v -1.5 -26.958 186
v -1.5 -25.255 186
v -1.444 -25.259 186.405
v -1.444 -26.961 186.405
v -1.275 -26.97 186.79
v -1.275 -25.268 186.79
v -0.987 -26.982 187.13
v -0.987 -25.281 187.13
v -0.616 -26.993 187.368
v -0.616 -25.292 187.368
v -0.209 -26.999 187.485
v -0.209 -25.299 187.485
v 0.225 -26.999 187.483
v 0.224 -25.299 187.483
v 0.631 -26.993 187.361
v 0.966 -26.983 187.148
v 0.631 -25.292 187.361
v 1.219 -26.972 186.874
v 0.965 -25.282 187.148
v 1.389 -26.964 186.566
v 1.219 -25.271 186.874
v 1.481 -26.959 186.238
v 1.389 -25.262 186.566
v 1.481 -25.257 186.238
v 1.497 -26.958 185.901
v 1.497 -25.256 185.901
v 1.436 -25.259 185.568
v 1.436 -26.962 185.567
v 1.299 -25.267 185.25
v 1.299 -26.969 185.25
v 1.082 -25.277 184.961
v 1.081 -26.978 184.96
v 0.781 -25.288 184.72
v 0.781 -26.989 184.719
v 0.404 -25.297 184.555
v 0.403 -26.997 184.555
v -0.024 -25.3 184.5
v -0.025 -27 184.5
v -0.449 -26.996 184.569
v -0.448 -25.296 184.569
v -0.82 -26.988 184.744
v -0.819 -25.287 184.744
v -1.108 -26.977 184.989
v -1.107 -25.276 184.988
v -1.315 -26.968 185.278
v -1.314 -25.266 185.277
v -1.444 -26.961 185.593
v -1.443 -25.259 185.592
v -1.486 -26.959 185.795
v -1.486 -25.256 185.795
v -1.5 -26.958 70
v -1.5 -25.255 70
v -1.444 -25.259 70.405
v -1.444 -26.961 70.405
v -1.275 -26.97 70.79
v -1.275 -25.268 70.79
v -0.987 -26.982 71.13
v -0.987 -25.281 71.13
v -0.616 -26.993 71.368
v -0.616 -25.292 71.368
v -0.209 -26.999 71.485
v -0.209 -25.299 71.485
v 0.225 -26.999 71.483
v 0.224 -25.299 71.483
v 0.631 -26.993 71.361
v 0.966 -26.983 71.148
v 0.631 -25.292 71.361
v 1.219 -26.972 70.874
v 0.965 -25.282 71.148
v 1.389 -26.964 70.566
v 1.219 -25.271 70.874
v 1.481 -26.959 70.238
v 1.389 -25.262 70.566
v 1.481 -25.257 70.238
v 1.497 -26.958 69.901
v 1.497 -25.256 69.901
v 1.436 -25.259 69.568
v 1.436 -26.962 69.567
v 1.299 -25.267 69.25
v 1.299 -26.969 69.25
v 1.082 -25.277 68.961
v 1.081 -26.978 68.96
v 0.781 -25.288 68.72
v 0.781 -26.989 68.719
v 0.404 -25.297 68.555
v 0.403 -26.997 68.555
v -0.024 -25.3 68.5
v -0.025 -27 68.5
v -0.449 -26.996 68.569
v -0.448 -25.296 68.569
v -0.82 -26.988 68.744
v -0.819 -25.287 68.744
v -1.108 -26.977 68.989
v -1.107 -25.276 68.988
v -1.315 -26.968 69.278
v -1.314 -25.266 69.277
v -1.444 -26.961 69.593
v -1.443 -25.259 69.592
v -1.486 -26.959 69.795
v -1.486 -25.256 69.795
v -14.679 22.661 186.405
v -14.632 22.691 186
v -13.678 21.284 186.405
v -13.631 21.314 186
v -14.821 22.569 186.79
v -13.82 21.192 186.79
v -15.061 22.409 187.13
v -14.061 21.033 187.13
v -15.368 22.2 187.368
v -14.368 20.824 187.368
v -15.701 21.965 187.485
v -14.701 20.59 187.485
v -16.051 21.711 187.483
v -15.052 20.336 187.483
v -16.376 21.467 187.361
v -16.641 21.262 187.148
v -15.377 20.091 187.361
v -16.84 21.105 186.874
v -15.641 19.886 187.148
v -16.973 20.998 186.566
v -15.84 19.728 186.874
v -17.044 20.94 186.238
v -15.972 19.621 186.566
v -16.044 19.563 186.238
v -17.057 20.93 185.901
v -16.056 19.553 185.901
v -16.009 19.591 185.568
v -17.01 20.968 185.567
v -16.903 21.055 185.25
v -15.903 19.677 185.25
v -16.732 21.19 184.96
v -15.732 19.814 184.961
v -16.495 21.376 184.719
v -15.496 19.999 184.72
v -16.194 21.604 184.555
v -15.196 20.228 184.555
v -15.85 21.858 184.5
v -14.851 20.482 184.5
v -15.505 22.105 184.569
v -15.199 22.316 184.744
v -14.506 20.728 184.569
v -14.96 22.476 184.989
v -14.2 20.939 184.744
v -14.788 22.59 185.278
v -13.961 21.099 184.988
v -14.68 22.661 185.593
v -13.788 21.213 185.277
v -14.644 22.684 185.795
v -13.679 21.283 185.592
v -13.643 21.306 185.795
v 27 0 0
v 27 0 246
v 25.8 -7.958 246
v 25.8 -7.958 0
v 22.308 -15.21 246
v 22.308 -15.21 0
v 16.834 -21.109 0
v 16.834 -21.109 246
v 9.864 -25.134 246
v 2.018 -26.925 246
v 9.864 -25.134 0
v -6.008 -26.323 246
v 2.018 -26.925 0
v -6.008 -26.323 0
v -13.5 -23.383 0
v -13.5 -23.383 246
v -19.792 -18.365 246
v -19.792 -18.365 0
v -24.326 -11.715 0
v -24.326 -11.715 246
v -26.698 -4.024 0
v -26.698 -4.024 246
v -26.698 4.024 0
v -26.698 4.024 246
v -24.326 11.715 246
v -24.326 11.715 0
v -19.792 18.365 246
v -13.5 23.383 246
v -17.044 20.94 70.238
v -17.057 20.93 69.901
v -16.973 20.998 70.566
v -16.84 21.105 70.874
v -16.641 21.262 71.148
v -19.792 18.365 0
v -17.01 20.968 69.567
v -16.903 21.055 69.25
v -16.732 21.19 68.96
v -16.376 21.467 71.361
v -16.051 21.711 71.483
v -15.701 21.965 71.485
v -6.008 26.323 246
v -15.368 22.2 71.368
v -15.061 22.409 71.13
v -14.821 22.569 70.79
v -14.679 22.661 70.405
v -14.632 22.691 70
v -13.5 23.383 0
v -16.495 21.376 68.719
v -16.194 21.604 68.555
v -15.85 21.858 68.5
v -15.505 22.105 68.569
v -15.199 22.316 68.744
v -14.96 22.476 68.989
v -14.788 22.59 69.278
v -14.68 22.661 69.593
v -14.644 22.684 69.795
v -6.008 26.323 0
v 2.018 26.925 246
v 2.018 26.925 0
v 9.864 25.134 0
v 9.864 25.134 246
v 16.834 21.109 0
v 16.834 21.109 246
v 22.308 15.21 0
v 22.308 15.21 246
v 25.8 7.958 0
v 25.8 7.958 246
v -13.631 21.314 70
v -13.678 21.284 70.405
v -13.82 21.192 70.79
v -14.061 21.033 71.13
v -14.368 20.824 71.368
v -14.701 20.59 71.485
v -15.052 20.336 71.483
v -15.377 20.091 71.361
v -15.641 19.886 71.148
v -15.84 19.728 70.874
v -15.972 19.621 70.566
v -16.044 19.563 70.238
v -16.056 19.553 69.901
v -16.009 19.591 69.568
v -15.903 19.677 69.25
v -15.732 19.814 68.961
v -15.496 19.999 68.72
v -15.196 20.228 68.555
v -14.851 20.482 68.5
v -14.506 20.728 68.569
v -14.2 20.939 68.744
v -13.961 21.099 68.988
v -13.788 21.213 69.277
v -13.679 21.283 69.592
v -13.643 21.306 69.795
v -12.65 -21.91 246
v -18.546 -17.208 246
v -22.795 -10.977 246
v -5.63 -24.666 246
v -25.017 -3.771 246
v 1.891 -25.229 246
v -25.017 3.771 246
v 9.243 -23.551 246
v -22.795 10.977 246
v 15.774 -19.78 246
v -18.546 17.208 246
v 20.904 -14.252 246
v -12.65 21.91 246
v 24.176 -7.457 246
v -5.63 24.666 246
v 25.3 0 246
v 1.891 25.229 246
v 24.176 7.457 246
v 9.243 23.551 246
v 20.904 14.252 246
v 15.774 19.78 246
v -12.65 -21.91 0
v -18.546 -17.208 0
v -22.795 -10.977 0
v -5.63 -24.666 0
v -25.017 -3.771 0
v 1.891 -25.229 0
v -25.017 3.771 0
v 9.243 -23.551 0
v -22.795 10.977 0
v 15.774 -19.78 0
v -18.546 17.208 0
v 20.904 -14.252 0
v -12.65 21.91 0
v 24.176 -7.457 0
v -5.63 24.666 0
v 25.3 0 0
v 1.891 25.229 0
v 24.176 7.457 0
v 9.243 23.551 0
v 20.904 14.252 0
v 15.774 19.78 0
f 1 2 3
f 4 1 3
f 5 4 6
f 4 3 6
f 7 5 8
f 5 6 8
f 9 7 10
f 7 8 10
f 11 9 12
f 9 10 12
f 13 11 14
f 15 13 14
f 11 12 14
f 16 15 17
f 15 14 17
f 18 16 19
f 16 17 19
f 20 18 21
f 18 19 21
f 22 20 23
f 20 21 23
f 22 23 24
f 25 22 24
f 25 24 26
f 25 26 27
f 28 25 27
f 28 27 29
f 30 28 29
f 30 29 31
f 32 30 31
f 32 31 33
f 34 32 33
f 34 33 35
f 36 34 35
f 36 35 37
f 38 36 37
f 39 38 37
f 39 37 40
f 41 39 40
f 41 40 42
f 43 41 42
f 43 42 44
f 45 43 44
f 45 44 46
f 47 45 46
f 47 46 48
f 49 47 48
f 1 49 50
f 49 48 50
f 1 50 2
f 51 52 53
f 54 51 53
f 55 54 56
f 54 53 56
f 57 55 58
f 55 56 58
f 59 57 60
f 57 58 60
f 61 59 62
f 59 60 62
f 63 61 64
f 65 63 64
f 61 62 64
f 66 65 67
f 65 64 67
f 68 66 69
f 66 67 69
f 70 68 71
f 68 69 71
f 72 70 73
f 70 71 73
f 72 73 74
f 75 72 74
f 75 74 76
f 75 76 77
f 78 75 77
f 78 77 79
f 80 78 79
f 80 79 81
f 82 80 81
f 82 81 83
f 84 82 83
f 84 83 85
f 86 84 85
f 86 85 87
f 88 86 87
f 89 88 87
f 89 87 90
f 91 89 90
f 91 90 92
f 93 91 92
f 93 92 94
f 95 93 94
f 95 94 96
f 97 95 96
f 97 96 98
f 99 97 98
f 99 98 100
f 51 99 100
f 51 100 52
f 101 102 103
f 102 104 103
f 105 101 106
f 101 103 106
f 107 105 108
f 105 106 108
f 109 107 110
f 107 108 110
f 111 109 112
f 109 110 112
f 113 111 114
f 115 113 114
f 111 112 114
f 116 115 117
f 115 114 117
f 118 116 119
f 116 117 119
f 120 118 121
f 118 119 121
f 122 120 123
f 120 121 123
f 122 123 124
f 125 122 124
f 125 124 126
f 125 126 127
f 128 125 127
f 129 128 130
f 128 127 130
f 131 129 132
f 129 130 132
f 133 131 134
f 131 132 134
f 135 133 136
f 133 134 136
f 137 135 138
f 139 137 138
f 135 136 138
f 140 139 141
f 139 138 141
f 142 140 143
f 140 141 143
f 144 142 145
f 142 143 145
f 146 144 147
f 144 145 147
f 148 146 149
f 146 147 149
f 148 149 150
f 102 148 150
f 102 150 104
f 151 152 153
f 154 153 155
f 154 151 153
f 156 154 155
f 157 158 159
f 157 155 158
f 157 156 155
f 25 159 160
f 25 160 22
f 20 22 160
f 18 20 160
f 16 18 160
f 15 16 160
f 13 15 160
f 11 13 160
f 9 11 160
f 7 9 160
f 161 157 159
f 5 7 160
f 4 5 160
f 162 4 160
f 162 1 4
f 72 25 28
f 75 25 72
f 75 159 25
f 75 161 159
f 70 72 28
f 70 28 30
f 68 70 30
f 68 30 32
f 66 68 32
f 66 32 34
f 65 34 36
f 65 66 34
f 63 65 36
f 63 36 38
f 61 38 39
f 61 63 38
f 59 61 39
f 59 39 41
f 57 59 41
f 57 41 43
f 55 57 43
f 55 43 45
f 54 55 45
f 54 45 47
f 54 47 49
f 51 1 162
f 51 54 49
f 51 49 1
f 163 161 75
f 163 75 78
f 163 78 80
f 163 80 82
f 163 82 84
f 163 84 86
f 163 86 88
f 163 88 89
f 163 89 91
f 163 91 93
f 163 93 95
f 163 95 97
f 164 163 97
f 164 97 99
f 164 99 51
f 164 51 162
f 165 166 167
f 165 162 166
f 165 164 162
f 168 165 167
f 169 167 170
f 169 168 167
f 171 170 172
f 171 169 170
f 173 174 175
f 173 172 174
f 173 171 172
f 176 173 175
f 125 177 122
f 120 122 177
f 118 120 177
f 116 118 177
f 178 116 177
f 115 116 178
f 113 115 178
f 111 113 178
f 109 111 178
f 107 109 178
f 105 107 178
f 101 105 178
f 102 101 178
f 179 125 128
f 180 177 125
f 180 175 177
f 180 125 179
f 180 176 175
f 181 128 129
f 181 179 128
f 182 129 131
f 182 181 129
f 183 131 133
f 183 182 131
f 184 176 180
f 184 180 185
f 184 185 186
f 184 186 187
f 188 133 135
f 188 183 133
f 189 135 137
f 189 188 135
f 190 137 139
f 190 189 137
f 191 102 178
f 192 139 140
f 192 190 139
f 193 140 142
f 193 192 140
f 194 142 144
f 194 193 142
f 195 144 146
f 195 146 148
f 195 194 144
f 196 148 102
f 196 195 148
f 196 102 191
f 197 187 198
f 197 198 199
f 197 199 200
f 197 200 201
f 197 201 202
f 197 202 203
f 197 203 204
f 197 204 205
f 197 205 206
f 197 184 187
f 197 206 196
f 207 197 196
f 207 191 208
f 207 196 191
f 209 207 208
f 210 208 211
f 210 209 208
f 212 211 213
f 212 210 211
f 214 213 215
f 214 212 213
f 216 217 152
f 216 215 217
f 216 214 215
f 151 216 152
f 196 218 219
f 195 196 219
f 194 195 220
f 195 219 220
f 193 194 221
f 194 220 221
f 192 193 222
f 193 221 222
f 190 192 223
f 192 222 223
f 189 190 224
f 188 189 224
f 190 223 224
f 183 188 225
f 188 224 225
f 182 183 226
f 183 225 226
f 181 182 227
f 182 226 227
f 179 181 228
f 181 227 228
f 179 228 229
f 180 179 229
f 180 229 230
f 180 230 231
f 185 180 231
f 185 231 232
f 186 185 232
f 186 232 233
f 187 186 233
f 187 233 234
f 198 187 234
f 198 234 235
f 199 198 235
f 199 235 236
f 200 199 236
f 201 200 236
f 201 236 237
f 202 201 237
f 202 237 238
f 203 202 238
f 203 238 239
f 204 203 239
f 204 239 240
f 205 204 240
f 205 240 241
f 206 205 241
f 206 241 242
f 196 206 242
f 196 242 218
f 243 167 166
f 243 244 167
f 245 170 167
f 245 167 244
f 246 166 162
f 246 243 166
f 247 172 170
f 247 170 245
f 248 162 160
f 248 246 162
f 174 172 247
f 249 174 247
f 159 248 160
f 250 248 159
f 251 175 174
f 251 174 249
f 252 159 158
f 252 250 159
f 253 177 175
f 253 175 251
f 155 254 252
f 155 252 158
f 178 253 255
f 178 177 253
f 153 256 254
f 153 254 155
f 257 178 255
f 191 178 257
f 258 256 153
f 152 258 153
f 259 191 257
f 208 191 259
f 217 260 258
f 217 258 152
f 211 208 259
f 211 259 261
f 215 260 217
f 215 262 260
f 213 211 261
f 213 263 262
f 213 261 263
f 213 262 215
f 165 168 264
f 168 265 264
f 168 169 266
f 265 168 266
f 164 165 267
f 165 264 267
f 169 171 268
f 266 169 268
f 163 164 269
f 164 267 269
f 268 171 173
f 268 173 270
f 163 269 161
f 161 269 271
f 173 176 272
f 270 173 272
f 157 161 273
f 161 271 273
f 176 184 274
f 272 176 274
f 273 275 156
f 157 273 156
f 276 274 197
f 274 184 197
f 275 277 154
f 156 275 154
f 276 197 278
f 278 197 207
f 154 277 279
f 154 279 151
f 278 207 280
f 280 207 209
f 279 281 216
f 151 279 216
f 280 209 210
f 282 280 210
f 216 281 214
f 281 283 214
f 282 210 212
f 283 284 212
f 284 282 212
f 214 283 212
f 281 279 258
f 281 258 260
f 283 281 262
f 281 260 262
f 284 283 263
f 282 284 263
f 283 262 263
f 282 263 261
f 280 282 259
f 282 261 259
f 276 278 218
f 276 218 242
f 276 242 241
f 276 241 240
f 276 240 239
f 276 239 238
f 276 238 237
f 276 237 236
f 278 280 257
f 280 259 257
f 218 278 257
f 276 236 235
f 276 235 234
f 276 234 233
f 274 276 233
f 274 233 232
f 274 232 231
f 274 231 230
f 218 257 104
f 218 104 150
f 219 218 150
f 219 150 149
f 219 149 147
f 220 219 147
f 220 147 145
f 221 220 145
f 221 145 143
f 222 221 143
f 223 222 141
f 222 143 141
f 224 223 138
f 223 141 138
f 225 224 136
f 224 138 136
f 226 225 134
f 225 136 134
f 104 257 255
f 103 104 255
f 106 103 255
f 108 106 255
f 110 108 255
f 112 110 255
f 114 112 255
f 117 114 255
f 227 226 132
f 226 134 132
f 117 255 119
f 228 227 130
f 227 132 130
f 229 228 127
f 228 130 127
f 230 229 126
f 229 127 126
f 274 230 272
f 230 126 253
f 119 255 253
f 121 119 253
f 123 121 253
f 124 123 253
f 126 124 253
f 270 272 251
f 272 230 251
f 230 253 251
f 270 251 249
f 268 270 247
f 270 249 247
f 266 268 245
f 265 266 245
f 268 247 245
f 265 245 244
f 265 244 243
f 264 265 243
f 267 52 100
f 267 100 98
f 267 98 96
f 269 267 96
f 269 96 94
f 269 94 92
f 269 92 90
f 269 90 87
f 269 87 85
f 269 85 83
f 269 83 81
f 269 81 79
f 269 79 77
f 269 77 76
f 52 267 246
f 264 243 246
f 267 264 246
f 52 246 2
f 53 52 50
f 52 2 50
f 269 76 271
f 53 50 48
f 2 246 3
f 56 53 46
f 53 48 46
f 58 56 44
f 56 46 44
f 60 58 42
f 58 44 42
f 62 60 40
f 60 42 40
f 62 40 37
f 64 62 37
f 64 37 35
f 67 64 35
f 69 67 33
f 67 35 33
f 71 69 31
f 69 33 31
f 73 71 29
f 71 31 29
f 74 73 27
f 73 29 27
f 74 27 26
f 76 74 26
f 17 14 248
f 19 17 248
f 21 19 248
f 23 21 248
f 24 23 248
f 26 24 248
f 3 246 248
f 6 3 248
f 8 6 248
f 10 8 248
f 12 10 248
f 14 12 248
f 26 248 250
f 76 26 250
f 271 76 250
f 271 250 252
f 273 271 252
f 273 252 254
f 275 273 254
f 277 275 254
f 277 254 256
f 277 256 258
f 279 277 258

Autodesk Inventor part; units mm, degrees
ref_plane "YZ Plane" through (0, 0, 0) normal (1, 0, 0) x (0, 1, 0)
ref_plane "XZ Plane" through (0, 0, 0) normal (0, 1, 0) x (-1, 0, 0)
ref_plane "XY Plane" through (0, 0, 0) normal (0, 0, 1) x (1, 0, 0)
sketch "Sketch1" plane through (0, 0, 0) normal (0, 0, 1) x (1, 0, 0)
  circle A0 centre (0, 0) radius 27
  dimension "d0" = 54
extrude "Extrusion1" add sketch "Sketch1" along normal blind 246
sketch "Sketch2" plane through (0, 0, 246) normal (0, 0, 1) x (1, 0, 0)
  circle A0 centre (0, 0) radius 25.3
  dimension "d3" = 50.6
extrude "Extrusion2" cut sketch "Sketch2" against normal through all
sketch "Sketch3" plane through (0, 0, 0) normal (0, 1, 0) x (-1, 0, 0)
  line L0 (0, 0) -> (0, 246)
  line L1 (0, 246) -> (0, 186)
  line L2 (0, 0) -> (0, 70)
  circle A0 centre (0, 186) radius 1.5
  circle A1 centre (0, 70) radius 1.5
  dimension "d6" = 60
  dimension "d7" = 246
  dimension "d8" = 70
  dimension "d9" = 3
extrude "Extrusion3" cut sketch "Sketch3" against normal through all
pattern_circular "Circular Pattern2" count 2 over 144 about axis through (0, 0, -10) along (0, 0, -1) of "Extrusion3"
properties part number "2207_Cu Tube_V1"
